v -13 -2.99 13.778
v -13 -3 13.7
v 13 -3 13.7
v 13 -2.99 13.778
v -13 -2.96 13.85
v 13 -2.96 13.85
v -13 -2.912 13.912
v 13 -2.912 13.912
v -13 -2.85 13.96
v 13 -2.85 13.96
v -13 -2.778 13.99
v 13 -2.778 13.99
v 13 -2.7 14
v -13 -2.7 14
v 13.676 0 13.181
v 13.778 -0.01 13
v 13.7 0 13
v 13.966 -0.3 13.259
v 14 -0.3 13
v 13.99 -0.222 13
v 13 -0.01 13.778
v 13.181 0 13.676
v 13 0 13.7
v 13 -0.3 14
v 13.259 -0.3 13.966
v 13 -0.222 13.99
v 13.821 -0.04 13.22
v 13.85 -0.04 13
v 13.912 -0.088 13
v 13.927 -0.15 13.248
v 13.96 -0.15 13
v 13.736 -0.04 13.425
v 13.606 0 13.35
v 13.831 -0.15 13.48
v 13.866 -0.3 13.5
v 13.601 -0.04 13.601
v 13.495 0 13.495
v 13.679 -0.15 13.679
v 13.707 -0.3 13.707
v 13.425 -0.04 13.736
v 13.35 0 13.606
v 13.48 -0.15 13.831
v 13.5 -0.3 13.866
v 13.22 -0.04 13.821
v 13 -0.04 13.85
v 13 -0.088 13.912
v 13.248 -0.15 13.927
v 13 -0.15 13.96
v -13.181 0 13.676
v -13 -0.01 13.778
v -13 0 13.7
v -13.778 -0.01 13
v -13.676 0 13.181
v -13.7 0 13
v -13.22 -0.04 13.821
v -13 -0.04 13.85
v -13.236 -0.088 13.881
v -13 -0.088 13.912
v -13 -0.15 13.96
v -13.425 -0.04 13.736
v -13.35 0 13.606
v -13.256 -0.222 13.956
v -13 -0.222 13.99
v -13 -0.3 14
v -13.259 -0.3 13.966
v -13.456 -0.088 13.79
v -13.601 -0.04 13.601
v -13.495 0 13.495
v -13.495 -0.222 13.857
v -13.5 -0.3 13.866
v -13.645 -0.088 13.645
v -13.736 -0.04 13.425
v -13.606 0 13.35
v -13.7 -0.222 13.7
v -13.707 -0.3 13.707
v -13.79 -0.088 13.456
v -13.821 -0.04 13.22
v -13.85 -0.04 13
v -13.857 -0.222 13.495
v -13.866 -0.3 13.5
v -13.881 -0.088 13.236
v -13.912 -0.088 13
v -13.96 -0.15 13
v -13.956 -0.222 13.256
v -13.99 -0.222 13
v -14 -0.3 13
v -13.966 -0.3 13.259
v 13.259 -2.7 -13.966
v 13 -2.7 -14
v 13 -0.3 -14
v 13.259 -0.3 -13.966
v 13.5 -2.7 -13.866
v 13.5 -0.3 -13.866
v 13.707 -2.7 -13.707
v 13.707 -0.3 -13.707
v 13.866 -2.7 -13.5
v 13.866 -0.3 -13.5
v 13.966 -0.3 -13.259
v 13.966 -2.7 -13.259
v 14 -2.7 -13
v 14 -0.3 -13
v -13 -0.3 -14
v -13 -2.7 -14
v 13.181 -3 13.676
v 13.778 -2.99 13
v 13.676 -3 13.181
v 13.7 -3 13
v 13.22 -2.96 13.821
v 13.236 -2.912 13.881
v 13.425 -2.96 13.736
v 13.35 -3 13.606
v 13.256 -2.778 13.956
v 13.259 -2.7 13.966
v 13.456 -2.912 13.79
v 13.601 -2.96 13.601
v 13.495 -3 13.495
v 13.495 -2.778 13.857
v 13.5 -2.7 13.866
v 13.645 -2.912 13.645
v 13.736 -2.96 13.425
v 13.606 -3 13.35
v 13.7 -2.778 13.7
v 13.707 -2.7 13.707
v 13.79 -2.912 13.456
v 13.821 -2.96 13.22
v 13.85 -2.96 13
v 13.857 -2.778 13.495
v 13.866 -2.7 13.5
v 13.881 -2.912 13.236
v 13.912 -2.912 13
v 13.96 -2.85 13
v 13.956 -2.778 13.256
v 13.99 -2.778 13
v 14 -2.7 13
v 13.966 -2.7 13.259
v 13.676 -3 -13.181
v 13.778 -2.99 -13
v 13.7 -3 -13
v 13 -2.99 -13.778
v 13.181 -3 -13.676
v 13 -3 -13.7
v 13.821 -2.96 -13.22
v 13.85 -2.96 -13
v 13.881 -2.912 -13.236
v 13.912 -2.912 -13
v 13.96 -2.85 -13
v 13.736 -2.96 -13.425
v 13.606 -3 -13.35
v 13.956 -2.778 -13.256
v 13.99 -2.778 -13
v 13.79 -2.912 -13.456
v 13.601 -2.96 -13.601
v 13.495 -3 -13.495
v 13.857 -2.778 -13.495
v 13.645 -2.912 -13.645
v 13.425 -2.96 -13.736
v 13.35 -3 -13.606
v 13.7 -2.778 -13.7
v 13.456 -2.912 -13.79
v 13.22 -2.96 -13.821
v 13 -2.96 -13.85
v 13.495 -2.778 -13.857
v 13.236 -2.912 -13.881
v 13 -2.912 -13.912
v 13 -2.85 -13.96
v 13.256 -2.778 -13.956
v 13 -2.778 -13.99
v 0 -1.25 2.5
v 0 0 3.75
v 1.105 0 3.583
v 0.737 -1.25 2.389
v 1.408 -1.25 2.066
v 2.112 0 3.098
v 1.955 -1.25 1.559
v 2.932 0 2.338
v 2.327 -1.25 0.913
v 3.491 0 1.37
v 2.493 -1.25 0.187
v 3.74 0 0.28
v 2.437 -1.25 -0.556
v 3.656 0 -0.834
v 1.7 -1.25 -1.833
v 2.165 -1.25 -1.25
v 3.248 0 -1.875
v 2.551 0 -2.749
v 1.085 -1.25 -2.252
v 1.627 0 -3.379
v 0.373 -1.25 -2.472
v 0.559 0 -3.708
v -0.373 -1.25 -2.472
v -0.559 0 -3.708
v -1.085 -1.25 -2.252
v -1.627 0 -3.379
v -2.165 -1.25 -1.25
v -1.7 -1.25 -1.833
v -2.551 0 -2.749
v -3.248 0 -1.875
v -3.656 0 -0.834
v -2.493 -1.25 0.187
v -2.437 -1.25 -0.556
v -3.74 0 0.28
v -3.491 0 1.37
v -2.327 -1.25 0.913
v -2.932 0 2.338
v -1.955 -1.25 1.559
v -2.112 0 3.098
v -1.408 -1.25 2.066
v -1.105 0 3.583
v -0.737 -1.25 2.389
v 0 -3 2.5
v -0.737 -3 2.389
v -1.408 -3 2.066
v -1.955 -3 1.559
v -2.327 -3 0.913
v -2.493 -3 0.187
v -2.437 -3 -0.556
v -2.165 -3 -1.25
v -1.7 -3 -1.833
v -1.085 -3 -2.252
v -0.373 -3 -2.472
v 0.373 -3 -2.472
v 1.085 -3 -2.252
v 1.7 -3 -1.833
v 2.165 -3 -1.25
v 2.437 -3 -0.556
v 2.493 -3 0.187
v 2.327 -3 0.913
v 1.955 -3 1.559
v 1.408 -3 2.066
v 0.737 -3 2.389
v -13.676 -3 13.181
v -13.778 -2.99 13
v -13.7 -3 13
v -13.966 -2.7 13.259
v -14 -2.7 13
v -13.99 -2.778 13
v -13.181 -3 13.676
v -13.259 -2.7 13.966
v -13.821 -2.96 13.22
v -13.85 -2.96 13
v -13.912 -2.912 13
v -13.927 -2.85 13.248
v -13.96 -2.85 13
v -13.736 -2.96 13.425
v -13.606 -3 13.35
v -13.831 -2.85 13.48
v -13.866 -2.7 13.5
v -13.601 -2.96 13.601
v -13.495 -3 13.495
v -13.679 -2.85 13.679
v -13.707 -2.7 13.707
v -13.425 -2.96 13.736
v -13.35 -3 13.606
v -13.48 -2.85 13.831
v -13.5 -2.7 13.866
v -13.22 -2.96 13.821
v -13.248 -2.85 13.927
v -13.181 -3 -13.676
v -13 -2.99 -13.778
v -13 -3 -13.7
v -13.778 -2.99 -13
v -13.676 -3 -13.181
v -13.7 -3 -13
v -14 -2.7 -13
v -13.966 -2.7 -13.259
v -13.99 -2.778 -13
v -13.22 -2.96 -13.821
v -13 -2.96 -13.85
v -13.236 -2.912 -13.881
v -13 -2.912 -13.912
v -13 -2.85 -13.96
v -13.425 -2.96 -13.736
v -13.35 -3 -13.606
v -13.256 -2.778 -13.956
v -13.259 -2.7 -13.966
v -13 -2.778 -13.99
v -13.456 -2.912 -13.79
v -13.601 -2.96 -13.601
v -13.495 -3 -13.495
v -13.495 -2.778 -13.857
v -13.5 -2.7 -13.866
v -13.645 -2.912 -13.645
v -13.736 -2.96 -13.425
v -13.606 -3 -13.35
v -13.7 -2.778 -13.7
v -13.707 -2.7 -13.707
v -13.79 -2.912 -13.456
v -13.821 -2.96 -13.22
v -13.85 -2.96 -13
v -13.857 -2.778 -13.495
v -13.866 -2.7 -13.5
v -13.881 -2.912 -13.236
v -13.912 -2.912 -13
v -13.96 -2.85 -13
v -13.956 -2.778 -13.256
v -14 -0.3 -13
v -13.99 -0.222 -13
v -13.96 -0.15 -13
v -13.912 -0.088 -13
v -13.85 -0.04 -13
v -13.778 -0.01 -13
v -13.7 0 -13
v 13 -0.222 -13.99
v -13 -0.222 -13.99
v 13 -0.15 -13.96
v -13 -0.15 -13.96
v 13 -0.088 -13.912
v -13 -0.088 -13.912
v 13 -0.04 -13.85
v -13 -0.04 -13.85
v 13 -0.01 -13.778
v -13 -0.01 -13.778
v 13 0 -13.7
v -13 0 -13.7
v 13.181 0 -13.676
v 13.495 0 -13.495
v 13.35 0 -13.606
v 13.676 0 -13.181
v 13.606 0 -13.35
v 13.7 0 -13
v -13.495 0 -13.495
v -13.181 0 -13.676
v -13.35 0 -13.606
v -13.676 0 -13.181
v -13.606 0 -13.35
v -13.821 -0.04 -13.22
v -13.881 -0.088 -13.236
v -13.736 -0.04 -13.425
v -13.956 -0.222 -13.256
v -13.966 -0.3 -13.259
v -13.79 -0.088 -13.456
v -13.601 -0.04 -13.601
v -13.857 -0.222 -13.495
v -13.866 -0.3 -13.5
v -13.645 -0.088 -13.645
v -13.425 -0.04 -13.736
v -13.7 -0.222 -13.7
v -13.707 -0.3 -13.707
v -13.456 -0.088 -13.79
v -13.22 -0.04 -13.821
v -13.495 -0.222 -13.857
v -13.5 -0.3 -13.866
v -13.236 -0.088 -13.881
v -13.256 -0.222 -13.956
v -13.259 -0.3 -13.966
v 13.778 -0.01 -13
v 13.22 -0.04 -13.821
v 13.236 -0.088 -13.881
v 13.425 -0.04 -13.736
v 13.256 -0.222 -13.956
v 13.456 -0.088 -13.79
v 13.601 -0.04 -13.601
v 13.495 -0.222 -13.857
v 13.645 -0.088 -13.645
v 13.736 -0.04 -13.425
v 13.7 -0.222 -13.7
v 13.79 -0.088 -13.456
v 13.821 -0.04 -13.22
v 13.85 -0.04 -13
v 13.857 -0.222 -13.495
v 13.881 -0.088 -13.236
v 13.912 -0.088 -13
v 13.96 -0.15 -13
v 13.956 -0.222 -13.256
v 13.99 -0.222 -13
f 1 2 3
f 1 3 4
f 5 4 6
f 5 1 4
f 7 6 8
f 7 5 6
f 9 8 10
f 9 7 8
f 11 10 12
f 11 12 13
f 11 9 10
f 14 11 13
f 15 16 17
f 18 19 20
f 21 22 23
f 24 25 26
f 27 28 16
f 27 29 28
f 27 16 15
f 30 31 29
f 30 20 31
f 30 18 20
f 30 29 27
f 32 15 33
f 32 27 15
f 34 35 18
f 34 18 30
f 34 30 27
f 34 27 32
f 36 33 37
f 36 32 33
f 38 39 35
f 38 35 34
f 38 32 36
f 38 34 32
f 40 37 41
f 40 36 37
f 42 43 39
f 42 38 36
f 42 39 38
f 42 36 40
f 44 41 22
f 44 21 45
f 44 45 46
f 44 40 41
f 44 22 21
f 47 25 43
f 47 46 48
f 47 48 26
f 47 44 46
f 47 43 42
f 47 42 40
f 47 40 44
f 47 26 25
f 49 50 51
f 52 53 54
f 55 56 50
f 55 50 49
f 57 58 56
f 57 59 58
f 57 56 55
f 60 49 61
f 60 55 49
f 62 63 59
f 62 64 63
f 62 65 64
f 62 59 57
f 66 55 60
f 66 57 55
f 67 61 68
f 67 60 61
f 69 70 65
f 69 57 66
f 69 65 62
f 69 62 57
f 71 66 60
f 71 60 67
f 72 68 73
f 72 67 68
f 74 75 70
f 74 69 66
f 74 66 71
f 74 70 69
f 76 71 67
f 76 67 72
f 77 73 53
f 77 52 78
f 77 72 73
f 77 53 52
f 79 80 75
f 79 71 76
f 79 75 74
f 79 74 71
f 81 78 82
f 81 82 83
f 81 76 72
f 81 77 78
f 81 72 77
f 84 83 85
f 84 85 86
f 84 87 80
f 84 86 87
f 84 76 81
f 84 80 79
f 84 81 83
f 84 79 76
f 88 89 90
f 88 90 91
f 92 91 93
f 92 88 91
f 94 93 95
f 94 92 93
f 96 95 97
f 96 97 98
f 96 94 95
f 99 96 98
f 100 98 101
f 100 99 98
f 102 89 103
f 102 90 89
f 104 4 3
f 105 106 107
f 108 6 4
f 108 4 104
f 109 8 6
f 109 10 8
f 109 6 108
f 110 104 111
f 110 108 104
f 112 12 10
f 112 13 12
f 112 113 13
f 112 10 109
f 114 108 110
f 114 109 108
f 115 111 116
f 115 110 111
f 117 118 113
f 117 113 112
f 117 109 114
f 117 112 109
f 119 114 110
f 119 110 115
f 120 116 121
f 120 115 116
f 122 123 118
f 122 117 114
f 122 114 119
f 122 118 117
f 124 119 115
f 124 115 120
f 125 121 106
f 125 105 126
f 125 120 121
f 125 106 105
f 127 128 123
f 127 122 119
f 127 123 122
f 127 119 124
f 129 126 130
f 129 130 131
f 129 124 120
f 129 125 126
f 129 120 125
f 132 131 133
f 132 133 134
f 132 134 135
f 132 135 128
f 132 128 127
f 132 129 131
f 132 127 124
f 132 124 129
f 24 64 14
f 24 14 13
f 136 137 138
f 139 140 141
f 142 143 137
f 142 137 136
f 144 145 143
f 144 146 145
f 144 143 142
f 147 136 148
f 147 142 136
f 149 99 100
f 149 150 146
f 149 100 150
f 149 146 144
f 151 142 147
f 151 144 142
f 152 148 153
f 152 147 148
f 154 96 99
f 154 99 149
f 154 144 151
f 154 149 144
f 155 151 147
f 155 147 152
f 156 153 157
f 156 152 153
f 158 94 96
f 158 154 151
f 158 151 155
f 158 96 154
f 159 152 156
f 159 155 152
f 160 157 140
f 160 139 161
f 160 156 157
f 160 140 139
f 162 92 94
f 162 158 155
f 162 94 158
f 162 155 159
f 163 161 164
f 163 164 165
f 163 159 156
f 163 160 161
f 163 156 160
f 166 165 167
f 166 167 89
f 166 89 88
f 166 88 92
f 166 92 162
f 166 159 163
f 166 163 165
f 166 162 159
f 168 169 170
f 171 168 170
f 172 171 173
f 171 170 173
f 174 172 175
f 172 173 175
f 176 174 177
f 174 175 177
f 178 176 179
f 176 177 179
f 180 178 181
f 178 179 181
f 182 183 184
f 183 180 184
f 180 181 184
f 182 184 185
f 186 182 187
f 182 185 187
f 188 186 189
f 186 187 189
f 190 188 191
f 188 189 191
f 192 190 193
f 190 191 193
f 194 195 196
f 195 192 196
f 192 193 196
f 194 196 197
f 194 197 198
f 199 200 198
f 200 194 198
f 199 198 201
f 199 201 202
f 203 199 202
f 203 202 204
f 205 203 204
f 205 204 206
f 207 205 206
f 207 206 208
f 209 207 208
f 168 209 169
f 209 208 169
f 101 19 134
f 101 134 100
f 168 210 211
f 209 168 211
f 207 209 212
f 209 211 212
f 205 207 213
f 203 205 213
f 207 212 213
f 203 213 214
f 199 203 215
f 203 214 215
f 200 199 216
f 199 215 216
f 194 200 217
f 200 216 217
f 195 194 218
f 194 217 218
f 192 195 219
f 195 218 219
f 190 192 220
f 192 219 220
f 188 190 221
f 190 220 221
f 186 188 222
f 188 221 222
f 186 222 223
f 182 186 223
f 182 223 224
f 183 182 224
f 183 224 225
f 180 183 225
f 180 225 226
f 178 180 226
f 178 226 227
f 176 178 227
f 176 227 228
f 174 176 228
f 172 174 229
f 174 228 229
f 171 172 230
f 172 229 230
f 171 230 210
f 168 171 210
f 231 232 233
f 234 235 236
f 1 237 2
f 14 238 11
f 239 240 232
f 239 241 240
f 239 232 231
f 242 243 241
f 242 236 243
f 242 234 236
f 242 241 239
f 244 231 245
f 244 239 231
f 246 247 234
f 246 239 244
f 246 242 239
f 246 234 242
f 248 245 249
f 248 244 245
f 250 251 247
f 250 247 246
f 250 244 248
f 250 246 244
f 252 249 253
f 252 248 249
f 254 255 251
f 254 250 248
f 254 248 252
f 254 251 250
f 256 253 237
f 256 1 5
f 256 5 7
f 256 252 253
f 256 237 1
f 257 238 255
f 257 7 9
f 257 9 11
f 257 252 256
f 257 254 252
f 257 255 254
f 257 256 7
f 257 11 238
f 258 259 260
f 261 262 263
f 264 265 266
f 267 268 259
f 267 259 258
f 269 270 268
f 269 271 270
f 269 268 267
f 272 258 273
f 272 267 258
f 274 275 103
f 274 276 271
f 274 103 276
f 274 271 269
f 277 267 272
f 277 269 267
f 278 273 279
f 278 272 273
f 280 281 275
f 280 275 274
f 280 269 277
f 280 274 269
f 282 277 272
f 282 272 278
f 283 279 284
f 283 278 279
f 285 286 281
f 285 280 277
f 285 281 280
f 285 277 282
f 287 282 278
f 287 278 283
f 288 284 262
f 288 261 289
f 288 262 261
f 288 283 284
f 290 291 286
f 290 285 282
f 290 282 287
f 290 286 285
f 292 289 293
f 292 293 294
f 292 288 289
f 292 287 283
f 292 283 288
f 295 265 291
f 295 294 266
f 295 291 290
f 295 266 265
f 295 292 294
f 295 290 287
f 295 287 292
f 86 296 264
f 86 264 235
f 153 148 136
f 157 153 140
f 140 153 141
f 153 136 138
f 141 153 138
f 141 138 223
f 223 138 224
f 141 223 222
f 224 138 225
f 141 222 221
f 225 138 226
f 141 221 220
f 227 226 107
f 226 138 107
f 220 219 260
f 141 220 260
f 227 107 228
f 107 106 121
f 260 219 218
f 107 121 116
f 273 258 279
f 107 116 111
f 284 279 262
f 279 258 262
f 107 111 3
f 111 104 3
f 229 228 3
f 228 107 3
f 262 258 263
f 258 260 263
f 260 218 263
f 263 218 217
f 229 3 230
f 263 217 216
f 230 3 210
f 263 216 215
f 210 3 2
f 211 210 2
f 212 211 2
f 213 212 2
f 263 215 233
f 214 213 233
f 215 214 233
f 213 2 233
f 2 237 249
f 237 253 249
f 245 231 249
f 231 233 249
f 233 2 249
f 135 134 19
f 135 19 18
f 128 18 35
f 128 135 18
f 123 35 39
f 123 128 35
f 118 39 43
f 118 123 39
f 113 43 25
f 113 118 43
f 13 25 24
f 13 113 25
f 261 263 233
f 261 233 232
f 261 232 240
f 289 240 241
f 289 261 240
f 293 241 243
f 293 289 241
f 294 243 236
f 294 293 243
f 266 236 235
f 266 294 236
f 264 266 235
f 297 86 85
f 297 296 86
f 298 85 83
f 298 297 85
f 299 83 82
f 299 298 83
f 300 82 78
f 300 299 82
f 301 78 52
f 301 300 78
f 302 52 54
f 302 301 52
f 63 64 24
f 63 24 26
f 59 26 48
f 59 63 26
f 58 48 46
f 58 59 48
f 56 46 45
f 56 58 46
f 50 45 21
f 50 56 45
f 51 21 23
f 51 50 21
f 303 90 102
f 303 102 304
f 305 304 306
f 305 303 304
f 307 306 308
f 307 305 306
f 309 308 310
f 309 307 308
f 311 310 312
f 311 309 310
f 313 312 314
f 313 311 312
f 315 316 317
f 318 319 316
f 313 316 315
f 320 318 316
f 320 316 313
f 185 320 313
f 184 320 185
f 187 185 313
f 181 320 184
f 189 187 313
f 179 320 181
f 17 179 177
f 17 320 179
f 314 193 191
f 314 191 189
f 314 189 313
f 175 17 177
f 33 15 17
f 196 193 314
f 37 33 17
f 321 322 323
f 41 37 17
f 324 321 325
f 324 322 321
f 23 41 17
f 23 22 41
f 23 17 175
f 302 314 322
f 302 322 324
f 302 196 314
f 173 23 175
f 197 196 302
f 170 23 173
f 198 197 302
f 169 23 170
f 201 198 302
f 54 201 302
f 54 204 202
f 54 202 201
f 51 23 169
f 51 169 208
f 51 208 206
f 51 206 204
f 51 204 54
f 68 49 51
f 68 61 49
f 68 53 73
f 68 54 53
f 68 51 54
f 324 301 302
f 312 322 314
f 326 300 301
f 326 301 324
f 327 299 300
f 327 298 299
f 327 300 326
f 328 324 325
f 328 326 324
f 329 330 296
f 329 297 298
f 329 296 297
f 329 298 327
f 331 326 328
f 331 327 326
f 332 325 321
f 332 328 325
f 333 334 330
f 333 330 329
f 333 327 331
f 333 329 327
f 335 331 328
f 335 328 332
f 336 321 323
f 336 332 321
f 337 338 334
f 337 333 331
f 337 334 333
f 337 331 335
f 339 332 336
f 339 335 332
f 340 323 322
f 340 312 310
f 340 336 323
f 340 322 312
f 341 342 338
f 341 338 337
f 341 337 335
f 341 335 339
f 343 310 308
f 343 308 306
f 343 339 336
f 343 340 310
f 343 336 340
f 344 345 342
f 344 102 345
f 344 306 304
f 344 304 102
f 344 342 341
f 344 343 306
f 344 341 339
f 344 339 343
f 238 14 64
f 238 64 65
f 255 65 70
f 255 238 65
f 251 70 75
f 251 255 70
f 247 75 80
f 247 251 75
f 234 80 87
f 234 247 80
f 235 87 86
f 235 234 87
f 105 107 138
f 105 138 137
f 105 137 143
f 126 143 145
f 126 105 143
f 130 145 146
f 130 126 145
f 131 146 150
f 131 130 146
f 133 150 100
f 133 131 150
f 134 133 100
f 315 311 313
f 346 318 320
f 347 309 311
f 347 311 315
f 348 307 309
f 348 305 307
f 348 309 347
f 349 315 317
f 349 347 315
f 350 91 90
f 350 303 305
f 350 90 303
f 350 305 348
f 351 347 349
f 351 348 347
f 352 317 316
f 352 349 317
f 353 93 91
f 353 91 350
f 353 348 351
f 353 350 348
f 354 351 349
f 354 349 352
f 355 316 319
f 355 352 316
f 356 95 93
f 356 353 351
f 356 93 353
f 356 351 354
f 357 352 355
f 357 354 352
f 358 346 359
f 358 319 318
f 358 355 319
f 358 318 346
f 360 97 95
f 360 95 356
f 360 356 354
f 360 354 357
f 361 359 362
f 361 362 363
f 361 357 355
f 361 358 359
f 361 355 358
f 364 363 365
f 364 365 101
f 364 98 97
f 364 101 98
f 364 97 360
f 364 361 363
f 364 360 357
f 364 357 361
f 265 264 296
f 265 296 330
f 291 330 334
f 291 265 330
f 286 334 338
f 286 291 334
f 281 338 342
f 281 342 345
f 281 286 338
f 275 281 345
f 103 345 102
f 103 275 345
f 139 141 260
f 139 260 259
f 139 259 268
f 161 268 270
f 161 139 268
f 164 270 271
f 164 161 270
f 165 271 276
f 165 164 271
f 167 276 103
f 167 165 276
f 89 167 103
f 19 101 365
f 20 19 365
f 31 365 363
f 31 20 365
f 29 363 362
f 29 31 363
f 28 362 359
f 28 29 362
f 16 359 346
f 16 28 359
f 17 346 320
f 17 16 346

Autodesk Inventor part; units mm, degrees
ref_plane "YZ Plane" through (0, 0, 0) normal (1, 0, 0) x (0, 1, 0)
ref_plane "XZ Plane" through (0, 0, 0) normal (0, 1, 0) x (-1, 0, 0)
ref_plane "XY Plane" through (0, 0, 0) normal (0, 0, 1) x (1, 0, 0)
sketch "Sketch1" plane through (0, 0, 0) normal (0, 1, 0) x (-1, 0, 0)
  line L0 (-14, -14) -> (14, -14)
  line L1 (14, -14) -> (14, 14)
  line L2 (14, 14) -> (-14, 14)
  line L3 (-14, 14) -> (-14, -14)
  line L4 (-14, -14) -> (14, 14) construction
  line L5 (14, -14) -> (-14, 14) construction
  point P0 (0, 0)
  dimension "d0" = 28
  dimension "d1" = 28
extrude "Extrusion1" add sketch "Sketch1" against normal blind 3
hole "Hole1" at (0, 0, 0) direction (0, -1, 0) diameter 5 end through all countersink diameter 7.5 countersink angle 90
fillet "Fillet1" radius 1 4 edges at (14, -1.5, 14) (14, -1.5, -14) (-14, -1.5, -14) (-14, -1.5, 14)
fillet "Fillet2" radius 0.3 16 edges at (13.7071, 0, 13.7071) (14, 0, 0) (13.7071, 0, -13.7071) (0, 0, -14) (-13.7071, 0, -13.7071) (-14, 0, 0) (-13.7071, 0, 13.7071) (0, 0, 14) (-13.7071, -3, 13.7071) (-14, -3, 0) (-13.7071, -3, -13.7071) (0, -3, -14) (13.7071, -3, -13.7071) (14, -3, 0) (13.7071, -3, 13.7071) (0, -3, 14)
properties part number "clampPlate" material "Steel, High Strength, Low Alloy"
